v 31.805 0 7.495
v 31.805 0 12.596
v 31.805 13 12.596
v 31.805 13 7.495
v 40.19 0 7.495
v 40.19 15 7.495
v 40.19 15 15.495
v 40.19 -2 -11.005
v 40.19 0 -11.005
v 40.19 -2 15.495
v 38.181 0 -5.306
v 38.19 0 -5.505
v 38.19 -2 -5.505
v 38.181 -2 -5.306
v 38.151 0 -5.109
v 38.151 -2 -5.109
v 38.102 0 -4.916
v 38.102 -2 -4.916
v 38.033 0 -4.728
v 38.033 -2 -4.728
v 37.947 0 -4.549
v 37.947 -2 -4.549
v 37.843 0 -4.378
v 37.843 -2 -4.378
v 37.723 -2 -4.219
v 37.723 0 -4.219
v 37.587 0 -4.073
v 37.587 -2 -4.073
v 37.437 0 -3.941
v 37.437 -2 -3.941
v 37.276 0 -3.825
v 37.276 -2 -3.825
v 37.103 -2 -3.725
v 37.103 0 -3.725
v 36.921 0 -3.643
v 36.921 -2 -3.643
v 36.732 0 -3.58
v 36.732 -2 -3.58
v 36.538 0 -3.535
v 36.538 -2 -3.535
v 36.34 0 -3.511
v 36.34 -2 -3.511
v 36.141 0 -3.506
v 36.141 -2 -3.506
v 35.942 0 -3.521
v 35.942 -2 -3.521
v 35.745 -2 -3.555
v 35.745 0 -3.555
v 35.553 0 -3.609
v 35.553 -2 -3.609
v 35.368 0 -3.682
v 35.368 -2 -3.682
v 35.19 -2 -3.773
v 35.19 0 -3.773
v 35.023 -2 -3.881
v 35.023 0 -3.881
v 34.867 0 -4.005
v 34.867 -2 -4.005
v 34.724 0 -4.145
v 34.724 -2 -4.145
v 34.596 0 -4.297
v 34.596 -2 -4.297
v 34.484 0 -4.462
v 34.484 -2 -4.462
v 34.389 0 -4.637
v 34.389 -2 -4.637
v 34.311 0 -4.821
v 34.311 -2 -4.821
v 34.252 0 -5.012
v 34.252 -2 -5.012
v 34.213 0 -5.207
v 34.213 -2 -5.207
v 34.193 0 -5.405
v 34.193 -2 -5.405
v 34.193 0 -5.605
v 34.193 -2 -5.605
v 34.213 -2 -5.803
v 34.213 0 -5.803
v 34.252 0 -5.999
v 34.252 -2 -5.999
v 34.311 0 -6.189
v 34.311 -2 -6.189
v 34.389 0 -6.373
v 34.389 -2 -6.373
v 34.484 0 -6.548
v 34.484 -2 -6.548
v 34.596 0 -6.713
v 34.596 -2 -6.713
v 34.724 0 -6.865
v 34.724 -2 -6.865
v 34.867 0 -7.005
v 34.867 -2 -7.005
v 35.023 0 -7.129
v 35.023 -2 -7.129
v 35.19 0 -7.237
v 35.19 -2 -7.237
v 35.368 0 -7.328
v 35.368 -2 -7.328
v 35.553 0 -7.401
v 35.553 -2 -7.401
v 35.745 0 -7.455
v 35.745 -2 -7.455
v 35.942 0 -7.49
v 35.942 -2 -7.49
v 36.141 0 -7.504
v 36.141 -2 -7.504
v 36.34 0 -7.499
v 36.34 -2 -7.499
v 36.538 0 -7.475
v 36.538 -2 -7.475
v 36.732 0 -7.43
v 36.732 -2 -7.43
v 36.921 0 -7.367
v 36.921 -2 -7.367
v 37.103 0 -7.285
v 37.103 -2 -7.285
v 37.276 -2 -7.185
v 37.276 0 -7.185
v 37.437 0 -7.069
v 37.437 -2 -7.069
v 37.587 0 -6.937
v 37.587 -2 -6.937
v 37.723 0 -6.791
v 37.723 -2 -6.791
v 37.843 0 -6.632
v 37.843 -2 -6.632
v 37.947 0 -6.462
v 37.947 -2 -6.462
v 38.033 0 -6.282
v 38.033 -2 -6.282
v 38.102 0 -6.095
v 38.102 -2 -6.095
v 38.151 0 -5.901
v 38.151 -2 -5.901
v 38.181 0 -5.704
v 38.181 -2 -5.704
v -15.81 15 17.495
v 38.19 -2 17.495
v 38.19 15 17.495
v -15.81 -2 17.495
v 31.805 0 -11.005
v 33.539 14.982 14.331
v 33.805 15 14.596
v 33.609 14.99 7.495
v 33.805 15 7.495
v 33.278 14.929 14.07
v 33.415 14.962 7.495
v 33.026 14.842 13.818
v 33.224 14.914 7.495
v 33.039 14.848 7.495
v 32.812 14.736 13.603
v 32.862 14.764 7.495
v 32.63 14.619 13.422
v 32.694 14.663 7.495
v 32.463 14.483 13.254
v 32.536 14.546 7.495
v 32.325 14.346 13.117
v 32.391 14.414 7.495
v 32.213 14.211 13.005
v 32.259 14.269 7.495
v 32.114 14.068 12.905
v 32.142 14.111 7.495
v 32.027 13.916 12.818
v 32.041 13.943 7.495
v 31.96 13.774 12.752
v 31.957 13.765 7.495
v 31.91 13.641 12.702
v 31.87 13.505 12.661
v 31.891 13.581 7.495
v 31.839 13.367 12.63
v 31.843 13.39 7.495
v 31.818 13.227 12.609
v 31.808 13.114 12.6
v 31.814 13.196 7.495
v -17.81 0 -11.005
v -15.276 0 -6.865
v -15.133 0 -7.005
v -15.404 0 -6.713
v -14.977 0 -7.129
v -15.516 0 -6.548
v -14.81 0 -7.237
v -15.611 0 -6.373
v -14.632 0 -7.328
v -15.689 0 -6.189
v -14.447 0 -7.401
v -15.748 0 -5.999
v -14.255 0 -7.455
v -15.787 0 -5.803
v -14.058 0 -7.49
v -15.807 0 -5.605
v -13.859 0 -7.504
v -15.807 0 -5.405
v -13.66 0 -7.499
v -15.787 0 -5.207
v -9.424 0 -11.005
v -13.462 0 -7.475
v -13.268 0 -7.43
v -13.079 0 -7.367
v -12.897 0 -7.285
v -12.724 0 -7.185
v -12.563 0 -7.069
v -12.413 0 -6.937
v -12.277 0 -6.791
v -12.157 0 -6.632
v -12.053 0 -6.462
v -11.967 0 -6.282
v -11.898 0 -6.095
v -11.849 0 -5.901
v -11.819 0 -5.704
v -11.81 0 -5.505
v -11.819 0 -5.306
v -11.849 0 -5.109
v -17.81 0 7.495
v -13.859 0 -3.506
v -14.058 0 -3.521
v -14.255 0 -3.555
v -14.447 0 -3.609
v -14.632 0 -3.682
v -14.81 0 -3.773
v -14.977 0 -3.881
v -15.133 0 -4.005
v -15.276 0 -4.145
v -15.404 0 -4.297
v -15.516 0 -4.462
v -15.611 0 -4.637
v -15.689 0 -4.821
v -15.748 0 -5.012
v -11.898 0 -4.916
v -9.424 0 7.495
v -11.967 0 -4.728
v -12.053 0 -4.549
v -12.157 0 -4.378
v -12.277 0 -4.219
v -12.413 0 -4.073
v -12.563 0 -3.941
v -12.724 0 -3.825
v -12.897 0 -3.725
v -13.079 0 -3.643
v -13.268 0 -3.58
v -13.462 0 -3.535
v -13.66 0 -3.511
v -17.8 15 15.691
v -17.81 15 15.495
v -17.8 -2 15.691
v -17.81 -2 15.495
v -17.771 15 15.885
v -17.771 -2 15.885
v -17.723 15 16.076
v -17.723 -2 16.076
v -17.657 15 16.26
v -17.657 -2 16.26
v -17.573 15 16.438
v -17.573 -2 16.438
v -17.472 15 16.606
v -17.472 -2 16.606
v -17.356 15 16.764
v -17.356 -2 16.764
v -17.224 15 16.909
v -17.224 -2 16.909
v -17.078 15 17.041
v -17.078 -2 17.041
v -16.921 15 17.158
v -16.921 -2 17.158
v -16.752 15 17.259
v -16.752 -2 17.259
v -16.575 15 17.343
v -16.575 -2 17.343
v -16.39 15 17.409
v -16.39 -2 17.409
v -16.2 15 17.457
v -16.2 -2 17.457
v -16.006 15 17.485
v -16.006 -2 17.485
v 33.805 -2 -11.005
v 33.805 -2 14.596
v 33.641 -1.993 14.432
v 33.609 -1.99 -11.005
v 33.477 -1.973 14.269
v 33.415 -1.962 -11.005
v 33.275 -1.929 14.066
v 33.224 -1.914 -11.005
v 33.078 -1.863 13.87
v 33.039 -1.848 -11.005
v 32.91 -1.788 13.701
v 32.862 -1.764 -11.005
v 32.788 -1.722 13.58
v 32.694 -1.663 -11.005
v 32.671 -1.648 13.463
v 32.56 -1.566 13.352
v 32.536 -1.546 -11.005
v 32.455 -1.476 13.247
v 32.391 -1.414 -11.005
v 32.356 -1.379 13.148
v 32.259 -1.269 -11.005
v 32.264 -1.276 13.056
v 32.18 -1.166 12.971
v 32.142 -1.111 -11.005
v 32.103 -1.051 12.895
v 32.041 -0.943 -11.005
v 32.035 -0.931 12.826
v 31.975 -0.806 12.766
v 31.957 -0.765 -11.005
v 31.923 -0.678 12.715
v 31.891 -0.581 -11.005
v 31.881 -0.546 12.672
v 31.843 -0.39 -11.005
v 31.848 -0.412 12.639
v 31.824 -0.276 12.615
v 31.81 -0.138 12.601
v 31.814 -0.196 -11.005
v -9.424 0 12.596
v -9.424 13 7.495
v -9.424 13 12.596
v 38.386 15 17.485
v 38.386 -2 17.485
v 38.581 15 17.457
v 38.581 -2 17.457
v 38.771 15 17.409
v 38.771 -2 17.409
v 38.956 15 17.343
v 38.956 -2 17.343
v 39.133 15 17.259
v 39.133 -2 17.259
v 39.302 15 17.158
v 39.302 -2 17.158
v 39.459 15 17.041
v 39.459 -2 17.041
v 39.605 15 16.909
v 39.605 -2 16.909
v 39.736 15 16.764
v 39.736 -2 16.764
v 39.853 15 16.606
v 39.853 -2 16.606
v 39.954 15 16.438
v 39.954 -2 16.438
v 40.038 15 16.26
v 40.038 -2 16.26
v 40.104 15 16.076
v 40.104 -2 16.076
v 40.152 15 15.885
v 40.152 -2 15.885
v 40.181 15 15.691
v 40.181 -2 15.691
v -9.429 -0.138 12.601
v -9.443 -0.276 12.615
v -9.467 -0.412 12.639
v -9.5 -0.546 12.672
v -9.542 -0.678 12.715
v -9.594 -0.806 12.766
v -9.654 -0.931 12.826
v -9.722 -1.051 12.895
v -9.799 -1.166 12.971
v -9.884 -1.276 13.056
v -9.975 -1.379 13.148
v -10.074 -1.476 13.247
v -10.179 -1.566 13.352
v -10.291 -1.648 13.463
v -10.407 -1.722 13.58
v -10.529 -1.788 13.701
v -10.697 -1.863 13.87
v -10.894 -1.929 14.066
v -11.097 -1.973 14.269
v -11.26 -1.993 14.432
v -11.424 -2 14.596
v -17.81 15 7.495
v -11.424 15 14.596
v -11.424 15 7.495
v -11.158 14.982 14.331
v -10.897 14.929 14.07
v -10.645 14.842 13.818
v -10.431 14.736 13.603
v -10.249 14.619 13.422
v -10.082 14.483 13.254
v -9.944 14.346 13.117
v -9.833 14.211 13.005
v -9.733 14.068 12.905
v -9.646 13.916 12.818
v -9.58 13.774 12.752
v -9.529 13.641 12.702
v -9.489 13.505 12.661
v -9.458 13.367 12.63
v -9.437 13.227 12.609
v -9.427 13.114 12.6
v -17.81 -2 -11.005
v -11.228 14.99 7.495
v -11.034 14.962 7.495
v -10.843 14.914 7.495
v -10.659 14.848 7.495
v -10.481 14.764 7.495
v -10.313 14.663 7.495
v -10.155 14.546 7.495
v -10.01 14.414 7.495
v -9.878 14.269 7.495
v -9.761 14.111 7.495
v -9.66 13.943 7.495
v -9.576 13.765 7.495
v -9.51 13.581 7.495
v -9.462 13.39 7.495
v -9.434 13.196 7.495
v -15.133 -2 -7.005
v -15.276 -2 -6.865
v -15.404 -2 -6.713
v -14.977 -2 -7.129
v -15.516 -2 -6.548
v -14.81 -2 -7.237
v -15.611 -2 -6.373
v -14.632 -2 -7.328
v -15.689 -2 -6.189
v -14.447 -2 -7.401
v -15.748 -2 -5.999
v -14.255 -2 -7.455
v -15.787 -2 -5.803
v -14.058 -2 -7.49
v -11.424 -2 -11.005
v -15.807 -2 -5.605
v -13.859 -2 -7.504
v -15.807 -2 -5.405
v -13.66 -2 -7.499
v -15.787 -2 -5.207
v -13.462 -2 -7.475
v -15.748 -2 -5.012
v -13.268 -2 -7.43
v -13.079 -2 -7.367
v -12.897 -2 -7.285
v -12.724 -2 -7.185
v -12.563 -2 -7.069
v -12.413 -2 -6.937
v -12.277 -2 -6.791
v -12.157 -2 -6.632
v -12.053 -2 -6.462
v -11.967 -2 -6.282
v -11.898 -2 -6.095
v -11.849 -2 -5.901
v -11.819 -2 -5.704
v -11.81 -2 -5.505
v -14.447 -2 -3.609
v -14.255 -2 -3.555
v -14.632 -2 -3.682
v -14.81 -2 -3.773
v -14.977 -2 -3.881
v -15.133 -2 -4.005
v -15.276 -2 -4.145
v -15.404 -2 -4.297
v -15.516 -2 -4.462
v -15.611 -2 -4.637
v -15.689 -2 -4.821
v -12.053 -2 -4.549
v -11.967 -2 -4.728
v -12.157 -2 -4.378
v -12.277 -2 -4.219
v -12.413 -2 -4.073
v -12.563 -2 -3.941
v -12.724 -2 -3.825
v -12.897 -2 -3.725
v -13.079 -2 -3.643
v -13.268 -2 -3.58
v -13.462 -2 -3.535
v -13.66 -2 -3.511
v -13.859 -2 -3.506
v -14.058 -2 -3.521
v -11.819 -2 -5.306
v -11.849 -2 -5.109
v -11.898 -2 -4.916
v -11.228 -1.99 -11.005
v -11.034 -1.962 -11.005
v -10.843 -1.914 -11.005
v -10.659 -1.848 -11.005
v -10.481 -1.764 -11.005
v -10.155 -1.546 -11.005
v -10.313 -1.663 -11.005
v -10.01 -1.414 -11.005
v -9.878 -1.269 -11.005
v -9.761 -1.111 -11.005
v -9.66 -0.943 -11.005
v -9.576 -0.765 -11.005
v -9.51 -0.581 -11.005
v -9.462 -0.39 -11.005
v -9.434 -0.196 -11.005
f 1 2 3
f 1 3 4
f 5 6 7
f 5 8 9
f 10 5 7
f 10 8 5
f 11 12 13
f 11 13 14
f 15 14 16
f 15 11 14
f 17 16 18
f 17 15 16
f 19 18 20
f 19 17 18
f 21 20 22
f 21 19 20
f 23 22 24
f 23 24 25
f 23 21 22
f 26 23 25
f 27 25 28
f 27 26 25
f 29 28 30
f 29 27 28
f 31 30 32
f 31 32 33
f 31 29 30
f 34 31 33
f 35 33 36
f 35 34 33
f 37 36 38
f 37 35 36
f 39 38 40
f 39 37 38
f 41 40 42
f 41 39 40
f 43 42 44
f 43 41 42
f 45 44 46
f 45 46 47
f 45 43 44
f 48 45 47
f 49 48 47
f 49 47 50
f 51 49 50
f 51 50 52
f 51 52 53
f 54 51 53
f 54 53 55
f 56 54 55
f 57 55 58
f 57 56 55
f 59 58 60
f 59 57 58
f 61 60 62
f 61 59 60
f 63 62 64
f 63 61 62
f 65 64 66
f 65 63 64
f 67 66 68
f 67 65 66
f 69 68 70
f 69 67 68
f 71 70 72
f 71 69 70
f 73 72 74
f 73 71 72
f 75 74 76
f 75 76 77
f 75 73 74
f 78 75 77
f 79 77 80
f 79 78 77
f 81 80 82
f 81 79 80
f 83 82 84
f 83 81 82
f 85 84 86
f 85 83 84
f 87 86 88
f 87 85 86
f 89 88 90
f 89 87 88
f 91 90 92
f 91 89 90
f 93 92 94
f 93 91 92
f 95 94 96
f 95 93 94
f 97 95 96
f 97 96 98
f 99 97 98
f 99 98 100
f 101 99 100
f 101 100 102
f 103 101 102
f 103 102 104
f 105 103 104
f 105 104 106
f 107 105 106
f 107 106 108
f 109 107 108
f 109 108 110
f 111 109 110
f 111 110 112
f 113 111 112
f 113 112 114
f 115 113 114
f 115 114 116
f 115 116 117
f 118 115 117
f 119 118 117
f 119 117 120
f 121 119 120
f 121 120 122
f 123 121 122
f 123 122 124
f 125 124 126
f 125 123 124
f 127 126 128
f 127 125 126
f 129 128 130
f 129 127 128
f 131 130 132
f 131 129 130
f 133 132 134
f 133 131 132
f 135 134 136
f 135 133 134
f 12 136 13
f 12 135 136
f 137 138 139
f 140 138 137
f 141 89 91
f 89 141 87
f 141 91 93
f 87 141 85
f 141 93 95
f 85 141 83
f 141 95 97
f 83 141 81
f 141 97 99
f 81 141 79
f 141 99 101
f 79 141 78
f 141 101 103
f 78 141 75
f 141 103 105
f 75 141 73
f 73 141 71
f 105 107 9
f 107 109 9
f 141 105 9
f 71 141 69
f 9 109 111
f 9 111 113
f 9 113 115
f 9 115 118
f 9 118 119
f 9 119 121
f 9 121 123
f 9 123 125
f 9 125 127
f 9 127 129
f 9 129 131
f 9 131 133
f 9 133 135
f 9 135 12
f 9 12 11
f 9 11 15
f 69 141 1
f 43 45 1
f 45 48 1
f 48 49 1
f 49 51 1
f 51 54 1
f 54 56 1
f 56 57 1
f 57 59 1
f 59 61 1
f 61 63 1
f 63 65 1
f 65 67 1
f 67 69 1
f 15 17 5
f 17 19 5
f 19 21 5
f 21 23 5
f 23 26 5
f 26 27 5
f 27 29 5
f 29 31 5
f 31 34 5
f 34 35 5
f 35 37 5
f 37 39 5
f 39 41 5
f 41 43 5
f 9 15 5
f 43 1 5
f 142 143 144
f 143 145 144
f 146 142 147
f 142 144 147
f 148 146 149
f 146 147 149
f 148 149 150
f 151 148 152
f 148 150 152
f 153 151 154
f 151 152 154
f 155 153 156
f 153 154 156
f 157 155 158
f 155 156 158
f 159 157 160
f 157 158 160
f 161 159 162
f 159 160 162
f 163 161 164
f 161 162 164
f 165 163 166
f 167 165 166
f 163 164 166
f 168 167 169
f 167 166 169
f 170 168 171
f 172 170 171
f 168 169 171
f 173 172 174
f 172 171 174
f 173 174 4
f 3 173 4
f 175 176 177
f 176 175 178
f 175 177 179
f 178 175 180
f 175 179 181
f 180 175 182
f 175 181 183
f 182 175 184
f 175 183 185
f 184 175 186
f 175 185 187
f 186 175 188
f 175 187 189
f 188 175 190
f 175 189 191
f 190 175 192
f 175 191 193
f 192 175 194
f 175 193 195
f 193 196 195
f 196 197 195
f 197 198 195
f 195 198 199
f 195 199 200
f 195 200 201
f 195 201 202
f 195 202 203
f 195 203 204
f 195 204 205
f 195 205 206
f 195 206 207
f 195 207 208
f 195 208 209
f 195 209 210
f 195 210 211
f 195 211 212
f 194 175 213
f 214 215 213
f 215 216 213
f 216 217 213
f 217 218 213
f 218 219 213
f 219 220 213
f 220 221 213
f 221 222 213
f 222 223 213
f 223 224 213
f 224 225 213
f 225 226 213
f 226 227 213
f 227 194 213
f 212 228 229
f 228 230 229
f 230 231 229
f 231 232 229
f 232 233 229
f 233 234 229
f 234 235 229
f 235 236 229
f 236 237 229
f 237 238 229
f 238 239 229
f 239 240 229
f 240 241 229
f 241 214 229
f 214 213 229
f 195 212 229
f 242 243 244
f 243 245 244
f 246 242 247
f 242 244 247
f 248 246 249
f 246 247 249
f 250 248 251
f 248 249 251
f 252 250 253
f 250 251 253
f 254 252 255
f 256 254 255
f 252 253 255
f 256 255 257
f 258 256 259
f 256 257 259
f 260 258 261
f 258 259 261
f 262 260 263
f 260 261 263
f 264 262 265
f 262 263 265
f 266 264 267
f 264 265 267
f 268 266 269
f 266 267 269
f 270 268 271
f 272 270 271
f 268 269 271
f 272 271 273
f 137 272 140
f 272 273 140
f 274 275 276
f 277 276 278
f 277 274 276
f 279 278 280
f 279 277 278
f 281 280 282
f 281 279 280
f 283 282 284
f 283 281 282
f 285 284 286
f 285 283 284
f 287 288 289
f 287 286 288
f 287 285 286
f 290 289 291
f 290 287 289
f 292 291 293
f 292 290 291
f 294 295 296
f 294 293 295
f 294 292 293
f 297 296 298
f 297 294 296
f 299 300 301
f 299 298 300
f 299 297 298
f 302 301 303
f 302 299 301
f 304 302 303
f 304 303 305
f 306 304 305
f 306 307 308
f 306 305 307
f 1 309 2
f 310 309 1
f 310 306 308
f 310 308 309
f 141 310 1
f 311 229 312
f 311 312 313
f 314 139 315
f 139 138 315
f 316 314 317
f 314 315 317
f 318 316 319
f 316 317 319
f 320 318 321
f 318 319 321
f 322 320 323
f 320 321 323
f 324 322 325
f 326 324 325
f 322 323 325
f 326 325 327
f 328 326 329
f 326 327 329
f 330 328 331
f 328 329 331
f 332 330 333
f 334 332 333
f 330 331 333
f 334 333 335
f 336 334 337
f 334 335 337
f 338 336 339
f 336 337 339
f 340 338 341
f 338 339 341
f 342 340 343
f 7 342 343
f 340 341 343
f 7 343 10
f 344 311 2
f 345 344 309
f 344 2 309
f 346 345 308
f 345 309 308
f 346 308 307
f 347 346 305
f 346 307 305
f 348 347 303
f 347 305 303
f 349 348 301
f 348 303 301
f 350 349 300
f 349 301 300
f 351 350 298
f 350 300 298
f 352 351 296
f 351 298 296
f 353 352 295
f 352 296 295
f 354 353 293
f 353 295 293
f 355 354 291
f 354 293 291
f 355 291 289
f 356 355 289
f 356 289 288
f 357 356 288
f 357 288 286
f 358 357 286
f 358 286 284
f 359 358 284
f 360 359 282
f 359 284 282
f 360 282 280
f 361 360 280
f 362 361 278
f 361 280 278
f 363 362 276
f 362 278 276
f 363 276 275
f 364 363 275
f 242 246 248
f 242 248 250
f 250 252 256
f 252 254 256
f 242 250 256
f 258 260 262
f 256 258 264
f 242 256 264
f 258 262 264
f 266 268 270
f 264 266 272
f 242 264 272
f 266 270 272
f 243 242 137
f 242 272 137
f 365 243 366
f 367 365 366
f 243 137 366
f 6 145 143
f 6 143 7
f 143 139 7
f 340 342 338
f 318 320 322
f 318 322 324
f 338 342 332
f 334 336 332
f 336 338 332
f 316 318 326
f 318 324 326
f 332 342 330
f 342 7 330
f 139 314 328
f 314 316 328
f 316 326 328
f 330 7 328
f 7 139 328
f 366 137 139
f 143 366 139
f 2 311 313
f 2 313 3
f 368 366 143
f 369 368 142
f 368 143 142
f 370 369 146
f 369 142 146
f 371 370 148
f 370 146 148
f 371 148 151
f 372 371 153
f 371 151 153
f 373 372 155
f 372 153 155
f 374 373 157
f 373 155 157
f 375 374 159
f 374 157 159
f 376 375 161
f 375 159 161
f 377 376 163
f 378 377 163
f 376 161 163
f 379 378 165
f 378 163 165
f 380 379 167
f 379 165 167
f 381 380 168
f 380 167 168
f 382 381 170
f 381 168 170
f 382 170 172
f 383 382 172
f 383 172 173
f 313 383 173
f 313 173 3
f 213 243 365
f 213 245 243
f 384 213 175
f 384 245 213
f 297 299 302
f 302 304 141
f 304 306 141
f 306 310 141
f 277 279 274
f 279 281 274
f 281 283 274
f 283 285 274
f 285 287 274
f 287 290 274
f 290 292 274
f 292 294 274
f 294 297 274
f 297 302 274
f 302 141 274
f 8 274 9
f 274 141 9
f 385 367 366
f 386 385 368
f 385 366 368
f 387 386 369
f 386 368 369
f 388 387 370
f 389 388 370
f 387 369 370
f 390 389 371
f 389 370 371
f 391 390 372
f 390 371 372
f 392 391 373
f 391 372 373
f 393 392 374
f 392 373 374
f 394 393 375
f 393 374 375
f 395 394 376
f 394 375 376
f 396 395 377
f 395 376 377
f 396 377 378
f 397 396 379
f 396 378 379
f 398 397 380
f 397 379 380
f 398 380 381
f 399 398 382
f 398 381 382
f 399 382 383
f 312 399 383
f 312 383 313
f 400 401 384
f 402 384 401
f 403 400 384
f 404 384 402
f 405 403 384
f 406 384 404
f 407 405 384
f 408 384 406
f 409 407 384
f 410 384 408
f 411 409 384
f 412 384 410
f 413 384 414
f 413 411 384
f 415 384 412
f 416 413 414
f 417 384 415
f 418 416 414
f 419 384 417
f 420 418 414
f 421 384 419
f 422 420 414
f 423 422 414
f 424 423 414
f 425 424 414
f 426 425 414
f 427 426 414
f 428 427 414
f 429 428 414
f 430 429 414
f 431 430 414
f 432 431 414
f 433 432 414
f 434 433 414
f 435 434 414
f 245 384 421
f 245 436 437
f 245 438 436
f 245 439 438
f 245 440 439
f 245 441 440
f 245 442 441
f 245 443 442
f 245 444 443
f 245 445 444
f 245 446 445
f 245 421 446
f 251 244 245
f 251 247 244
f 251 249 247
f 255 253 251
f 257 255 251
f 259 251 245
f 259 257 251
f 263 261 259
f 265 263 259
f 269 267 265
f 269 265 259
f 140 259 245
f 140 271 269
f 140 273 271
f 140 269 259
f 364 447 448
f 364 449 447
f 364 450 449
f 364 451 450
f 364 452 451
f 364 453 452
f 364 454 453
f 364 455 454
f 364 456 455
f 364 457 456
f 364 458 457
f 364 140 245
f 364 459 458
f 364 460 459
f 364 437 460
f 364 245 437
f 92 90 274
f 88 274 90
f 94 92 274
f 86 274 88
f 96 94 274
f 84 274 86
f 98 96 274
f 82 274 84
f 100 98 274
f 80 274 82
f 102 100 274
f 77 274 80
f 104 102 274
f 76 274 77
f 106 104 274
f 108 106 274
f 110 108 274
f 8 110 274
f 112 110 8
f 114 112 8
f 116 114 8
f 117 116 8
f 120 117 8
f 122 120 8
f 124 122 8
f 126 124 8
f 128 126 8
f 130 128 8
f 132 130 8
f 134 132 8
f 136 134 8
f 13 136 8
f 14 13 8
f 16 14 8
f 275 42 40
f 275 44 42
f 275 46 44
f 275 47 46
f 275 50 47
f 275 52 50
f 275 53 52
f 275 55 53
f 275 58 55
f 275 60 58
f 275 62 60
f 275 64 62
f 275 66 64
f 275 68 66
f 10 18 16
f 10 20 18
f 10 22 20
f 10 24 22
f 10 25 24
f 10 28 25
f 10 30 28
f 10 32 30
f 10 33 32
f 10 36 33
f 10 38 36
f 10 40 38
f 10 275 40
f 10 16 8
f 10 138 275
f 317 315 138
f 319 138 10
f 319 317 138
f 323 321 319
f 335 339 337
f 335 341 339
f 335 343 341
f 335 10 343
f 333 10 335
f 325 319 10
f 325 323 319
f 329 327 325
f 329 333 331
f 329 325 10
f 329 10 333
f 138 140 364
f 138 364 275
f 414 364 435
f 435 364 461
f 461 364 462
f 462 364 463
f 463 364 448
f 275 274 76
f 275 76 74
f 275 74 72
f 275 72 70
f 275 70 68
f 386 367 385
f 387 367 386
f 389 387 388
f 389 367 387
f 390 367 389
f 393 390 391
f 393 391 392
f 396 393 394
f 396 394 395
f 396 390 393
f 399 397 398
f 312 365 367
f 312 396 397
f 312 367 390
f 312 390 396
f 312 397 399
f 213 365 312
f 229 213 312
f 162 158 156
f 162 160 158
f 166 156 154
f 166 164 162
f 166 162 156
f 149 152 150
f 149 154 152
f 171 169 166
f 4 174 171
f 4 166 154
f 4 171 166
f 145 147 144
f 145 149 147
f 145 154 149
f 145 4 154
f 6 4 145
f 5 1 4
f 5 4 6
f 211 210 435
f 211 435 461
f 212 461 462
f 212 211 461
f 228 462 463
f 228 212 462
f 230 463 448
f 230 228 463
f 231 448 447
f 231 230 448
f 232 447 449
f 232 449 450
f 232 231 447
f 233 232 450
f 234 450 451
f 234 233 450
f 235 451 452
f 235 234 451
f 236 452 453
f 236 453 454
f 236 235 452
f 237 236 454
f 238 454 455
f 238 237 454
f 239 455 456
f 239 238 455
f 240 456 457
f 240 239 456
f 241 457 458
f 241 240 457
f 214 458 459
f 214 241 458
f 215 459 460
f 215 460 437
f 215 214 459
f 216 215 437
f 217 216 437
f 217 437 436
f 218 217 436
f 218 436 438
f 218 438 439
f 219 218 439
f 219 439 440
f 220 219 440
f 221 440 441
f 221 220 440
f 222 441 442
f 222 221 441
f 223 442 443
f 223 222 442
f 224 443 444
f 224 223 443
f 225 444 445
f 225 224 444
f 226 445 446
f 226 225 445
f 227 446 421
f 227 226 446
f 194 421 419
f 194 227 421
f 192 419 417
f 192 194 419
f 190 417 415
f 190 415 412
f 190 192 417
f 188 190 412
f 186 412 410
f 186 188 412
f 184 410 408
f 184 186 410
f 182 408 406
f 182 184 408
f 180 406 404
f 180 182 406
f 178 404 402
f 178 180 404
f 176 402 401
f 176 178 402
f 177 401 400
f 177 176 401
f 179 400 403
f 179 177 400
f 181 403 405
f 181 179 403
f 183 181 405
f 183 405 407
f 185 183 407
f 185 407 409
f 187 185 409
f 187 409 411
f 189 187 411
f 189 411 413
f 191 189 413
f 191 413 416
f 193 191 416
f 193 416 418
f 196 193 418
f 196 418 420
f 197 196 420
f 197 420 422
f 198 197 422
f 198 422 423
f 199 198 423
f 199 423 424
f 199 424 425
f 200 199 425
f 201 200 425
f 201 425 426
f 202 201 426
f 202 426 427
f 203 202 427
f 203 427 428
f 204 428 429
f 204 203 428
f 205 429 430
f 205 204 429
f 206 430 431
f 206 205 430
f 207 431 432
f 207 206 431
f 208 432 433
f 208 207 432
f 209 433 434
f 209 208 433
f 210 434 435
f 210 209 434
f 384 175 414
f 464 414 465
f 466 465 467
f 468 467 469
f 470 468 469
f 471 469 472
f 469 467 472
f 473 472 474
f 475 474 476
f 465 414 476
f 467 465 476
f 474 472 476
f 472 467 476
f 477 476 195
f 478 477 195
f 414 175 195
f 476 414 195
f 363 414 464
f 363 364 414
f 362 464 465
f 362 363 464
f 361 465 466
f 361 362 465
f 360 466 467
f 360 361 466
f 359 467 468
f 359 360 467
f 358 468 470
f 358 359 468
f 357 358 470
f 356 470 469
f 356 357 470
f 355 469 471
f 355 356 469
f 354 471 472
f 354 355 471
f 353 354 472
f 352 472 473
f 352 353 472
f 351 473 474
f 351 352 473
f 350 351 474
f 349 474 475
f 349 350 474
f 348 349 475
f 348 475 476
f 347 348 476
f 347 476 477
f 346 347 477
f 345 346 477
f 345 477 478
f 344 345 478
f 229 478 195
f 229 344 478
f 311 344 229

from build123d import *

# Parameters (mm, degrees)
F0_R     = 2
F1_DEPTH = 2
F3_DEPTH = 15
F4_R     = 2


with BuildPart() as f1:
    # F0 (on Front) → F1 (new body)
    with BuildSketch(Plane.XZ):
        Polygon((40.190461, 17.494964), (-17.809539, 17.494964), (-17.809539, -11.005036), (-9.423875, -11.005036), (-9.423875, 12.596268), (31.804797, 12.596268), (31.804797, -11.005036), (40.190461, -11.005036), align=None)
        with Locations((-13.809539, -5.505036)):
            Circle(F0_R, mode=Mode.SUBTRACT)
        with Locations((36.190461, -5.505036)):
            Circle(F0_R, mode=Mode.SUBTRACT)
    extrude(amount=F1_DEPTH)

    # F2 (on face) → F3 (join)
    with BuildSketch(Plane.XZ):
        Polygon((31.804797, 7.494964), (40.190461, 7.494964), (40.190461, 17.494964), (-17.809539, 17.494964), (-17.809539, 7.494964), (-9.423875, 7.494964), (-9.423875, 12.596268), (31.804797, 12.596268), align=None)
    extrude(amount=-F3_DEPTH)

    # F4
    f4_edges = [f1.edges().sort_by_distance(p)[0] for p in [
        (-17.809539, 6.5, 17.494964),
        (40.190461, 6.5, 17.494964),
        (11.190461, -2, 12.596268),
        (31.804797, -2, 0.795616),
        (-9.423875, -2, 0.795616),
        (31.804797, 15, 10.045616),
        (11.190461, 15, 12.596268),
        (-9.423875, 15, 10.045616),
    ]]
    fillet(f4_edges, radius=F4_R)


solid = f1.part
